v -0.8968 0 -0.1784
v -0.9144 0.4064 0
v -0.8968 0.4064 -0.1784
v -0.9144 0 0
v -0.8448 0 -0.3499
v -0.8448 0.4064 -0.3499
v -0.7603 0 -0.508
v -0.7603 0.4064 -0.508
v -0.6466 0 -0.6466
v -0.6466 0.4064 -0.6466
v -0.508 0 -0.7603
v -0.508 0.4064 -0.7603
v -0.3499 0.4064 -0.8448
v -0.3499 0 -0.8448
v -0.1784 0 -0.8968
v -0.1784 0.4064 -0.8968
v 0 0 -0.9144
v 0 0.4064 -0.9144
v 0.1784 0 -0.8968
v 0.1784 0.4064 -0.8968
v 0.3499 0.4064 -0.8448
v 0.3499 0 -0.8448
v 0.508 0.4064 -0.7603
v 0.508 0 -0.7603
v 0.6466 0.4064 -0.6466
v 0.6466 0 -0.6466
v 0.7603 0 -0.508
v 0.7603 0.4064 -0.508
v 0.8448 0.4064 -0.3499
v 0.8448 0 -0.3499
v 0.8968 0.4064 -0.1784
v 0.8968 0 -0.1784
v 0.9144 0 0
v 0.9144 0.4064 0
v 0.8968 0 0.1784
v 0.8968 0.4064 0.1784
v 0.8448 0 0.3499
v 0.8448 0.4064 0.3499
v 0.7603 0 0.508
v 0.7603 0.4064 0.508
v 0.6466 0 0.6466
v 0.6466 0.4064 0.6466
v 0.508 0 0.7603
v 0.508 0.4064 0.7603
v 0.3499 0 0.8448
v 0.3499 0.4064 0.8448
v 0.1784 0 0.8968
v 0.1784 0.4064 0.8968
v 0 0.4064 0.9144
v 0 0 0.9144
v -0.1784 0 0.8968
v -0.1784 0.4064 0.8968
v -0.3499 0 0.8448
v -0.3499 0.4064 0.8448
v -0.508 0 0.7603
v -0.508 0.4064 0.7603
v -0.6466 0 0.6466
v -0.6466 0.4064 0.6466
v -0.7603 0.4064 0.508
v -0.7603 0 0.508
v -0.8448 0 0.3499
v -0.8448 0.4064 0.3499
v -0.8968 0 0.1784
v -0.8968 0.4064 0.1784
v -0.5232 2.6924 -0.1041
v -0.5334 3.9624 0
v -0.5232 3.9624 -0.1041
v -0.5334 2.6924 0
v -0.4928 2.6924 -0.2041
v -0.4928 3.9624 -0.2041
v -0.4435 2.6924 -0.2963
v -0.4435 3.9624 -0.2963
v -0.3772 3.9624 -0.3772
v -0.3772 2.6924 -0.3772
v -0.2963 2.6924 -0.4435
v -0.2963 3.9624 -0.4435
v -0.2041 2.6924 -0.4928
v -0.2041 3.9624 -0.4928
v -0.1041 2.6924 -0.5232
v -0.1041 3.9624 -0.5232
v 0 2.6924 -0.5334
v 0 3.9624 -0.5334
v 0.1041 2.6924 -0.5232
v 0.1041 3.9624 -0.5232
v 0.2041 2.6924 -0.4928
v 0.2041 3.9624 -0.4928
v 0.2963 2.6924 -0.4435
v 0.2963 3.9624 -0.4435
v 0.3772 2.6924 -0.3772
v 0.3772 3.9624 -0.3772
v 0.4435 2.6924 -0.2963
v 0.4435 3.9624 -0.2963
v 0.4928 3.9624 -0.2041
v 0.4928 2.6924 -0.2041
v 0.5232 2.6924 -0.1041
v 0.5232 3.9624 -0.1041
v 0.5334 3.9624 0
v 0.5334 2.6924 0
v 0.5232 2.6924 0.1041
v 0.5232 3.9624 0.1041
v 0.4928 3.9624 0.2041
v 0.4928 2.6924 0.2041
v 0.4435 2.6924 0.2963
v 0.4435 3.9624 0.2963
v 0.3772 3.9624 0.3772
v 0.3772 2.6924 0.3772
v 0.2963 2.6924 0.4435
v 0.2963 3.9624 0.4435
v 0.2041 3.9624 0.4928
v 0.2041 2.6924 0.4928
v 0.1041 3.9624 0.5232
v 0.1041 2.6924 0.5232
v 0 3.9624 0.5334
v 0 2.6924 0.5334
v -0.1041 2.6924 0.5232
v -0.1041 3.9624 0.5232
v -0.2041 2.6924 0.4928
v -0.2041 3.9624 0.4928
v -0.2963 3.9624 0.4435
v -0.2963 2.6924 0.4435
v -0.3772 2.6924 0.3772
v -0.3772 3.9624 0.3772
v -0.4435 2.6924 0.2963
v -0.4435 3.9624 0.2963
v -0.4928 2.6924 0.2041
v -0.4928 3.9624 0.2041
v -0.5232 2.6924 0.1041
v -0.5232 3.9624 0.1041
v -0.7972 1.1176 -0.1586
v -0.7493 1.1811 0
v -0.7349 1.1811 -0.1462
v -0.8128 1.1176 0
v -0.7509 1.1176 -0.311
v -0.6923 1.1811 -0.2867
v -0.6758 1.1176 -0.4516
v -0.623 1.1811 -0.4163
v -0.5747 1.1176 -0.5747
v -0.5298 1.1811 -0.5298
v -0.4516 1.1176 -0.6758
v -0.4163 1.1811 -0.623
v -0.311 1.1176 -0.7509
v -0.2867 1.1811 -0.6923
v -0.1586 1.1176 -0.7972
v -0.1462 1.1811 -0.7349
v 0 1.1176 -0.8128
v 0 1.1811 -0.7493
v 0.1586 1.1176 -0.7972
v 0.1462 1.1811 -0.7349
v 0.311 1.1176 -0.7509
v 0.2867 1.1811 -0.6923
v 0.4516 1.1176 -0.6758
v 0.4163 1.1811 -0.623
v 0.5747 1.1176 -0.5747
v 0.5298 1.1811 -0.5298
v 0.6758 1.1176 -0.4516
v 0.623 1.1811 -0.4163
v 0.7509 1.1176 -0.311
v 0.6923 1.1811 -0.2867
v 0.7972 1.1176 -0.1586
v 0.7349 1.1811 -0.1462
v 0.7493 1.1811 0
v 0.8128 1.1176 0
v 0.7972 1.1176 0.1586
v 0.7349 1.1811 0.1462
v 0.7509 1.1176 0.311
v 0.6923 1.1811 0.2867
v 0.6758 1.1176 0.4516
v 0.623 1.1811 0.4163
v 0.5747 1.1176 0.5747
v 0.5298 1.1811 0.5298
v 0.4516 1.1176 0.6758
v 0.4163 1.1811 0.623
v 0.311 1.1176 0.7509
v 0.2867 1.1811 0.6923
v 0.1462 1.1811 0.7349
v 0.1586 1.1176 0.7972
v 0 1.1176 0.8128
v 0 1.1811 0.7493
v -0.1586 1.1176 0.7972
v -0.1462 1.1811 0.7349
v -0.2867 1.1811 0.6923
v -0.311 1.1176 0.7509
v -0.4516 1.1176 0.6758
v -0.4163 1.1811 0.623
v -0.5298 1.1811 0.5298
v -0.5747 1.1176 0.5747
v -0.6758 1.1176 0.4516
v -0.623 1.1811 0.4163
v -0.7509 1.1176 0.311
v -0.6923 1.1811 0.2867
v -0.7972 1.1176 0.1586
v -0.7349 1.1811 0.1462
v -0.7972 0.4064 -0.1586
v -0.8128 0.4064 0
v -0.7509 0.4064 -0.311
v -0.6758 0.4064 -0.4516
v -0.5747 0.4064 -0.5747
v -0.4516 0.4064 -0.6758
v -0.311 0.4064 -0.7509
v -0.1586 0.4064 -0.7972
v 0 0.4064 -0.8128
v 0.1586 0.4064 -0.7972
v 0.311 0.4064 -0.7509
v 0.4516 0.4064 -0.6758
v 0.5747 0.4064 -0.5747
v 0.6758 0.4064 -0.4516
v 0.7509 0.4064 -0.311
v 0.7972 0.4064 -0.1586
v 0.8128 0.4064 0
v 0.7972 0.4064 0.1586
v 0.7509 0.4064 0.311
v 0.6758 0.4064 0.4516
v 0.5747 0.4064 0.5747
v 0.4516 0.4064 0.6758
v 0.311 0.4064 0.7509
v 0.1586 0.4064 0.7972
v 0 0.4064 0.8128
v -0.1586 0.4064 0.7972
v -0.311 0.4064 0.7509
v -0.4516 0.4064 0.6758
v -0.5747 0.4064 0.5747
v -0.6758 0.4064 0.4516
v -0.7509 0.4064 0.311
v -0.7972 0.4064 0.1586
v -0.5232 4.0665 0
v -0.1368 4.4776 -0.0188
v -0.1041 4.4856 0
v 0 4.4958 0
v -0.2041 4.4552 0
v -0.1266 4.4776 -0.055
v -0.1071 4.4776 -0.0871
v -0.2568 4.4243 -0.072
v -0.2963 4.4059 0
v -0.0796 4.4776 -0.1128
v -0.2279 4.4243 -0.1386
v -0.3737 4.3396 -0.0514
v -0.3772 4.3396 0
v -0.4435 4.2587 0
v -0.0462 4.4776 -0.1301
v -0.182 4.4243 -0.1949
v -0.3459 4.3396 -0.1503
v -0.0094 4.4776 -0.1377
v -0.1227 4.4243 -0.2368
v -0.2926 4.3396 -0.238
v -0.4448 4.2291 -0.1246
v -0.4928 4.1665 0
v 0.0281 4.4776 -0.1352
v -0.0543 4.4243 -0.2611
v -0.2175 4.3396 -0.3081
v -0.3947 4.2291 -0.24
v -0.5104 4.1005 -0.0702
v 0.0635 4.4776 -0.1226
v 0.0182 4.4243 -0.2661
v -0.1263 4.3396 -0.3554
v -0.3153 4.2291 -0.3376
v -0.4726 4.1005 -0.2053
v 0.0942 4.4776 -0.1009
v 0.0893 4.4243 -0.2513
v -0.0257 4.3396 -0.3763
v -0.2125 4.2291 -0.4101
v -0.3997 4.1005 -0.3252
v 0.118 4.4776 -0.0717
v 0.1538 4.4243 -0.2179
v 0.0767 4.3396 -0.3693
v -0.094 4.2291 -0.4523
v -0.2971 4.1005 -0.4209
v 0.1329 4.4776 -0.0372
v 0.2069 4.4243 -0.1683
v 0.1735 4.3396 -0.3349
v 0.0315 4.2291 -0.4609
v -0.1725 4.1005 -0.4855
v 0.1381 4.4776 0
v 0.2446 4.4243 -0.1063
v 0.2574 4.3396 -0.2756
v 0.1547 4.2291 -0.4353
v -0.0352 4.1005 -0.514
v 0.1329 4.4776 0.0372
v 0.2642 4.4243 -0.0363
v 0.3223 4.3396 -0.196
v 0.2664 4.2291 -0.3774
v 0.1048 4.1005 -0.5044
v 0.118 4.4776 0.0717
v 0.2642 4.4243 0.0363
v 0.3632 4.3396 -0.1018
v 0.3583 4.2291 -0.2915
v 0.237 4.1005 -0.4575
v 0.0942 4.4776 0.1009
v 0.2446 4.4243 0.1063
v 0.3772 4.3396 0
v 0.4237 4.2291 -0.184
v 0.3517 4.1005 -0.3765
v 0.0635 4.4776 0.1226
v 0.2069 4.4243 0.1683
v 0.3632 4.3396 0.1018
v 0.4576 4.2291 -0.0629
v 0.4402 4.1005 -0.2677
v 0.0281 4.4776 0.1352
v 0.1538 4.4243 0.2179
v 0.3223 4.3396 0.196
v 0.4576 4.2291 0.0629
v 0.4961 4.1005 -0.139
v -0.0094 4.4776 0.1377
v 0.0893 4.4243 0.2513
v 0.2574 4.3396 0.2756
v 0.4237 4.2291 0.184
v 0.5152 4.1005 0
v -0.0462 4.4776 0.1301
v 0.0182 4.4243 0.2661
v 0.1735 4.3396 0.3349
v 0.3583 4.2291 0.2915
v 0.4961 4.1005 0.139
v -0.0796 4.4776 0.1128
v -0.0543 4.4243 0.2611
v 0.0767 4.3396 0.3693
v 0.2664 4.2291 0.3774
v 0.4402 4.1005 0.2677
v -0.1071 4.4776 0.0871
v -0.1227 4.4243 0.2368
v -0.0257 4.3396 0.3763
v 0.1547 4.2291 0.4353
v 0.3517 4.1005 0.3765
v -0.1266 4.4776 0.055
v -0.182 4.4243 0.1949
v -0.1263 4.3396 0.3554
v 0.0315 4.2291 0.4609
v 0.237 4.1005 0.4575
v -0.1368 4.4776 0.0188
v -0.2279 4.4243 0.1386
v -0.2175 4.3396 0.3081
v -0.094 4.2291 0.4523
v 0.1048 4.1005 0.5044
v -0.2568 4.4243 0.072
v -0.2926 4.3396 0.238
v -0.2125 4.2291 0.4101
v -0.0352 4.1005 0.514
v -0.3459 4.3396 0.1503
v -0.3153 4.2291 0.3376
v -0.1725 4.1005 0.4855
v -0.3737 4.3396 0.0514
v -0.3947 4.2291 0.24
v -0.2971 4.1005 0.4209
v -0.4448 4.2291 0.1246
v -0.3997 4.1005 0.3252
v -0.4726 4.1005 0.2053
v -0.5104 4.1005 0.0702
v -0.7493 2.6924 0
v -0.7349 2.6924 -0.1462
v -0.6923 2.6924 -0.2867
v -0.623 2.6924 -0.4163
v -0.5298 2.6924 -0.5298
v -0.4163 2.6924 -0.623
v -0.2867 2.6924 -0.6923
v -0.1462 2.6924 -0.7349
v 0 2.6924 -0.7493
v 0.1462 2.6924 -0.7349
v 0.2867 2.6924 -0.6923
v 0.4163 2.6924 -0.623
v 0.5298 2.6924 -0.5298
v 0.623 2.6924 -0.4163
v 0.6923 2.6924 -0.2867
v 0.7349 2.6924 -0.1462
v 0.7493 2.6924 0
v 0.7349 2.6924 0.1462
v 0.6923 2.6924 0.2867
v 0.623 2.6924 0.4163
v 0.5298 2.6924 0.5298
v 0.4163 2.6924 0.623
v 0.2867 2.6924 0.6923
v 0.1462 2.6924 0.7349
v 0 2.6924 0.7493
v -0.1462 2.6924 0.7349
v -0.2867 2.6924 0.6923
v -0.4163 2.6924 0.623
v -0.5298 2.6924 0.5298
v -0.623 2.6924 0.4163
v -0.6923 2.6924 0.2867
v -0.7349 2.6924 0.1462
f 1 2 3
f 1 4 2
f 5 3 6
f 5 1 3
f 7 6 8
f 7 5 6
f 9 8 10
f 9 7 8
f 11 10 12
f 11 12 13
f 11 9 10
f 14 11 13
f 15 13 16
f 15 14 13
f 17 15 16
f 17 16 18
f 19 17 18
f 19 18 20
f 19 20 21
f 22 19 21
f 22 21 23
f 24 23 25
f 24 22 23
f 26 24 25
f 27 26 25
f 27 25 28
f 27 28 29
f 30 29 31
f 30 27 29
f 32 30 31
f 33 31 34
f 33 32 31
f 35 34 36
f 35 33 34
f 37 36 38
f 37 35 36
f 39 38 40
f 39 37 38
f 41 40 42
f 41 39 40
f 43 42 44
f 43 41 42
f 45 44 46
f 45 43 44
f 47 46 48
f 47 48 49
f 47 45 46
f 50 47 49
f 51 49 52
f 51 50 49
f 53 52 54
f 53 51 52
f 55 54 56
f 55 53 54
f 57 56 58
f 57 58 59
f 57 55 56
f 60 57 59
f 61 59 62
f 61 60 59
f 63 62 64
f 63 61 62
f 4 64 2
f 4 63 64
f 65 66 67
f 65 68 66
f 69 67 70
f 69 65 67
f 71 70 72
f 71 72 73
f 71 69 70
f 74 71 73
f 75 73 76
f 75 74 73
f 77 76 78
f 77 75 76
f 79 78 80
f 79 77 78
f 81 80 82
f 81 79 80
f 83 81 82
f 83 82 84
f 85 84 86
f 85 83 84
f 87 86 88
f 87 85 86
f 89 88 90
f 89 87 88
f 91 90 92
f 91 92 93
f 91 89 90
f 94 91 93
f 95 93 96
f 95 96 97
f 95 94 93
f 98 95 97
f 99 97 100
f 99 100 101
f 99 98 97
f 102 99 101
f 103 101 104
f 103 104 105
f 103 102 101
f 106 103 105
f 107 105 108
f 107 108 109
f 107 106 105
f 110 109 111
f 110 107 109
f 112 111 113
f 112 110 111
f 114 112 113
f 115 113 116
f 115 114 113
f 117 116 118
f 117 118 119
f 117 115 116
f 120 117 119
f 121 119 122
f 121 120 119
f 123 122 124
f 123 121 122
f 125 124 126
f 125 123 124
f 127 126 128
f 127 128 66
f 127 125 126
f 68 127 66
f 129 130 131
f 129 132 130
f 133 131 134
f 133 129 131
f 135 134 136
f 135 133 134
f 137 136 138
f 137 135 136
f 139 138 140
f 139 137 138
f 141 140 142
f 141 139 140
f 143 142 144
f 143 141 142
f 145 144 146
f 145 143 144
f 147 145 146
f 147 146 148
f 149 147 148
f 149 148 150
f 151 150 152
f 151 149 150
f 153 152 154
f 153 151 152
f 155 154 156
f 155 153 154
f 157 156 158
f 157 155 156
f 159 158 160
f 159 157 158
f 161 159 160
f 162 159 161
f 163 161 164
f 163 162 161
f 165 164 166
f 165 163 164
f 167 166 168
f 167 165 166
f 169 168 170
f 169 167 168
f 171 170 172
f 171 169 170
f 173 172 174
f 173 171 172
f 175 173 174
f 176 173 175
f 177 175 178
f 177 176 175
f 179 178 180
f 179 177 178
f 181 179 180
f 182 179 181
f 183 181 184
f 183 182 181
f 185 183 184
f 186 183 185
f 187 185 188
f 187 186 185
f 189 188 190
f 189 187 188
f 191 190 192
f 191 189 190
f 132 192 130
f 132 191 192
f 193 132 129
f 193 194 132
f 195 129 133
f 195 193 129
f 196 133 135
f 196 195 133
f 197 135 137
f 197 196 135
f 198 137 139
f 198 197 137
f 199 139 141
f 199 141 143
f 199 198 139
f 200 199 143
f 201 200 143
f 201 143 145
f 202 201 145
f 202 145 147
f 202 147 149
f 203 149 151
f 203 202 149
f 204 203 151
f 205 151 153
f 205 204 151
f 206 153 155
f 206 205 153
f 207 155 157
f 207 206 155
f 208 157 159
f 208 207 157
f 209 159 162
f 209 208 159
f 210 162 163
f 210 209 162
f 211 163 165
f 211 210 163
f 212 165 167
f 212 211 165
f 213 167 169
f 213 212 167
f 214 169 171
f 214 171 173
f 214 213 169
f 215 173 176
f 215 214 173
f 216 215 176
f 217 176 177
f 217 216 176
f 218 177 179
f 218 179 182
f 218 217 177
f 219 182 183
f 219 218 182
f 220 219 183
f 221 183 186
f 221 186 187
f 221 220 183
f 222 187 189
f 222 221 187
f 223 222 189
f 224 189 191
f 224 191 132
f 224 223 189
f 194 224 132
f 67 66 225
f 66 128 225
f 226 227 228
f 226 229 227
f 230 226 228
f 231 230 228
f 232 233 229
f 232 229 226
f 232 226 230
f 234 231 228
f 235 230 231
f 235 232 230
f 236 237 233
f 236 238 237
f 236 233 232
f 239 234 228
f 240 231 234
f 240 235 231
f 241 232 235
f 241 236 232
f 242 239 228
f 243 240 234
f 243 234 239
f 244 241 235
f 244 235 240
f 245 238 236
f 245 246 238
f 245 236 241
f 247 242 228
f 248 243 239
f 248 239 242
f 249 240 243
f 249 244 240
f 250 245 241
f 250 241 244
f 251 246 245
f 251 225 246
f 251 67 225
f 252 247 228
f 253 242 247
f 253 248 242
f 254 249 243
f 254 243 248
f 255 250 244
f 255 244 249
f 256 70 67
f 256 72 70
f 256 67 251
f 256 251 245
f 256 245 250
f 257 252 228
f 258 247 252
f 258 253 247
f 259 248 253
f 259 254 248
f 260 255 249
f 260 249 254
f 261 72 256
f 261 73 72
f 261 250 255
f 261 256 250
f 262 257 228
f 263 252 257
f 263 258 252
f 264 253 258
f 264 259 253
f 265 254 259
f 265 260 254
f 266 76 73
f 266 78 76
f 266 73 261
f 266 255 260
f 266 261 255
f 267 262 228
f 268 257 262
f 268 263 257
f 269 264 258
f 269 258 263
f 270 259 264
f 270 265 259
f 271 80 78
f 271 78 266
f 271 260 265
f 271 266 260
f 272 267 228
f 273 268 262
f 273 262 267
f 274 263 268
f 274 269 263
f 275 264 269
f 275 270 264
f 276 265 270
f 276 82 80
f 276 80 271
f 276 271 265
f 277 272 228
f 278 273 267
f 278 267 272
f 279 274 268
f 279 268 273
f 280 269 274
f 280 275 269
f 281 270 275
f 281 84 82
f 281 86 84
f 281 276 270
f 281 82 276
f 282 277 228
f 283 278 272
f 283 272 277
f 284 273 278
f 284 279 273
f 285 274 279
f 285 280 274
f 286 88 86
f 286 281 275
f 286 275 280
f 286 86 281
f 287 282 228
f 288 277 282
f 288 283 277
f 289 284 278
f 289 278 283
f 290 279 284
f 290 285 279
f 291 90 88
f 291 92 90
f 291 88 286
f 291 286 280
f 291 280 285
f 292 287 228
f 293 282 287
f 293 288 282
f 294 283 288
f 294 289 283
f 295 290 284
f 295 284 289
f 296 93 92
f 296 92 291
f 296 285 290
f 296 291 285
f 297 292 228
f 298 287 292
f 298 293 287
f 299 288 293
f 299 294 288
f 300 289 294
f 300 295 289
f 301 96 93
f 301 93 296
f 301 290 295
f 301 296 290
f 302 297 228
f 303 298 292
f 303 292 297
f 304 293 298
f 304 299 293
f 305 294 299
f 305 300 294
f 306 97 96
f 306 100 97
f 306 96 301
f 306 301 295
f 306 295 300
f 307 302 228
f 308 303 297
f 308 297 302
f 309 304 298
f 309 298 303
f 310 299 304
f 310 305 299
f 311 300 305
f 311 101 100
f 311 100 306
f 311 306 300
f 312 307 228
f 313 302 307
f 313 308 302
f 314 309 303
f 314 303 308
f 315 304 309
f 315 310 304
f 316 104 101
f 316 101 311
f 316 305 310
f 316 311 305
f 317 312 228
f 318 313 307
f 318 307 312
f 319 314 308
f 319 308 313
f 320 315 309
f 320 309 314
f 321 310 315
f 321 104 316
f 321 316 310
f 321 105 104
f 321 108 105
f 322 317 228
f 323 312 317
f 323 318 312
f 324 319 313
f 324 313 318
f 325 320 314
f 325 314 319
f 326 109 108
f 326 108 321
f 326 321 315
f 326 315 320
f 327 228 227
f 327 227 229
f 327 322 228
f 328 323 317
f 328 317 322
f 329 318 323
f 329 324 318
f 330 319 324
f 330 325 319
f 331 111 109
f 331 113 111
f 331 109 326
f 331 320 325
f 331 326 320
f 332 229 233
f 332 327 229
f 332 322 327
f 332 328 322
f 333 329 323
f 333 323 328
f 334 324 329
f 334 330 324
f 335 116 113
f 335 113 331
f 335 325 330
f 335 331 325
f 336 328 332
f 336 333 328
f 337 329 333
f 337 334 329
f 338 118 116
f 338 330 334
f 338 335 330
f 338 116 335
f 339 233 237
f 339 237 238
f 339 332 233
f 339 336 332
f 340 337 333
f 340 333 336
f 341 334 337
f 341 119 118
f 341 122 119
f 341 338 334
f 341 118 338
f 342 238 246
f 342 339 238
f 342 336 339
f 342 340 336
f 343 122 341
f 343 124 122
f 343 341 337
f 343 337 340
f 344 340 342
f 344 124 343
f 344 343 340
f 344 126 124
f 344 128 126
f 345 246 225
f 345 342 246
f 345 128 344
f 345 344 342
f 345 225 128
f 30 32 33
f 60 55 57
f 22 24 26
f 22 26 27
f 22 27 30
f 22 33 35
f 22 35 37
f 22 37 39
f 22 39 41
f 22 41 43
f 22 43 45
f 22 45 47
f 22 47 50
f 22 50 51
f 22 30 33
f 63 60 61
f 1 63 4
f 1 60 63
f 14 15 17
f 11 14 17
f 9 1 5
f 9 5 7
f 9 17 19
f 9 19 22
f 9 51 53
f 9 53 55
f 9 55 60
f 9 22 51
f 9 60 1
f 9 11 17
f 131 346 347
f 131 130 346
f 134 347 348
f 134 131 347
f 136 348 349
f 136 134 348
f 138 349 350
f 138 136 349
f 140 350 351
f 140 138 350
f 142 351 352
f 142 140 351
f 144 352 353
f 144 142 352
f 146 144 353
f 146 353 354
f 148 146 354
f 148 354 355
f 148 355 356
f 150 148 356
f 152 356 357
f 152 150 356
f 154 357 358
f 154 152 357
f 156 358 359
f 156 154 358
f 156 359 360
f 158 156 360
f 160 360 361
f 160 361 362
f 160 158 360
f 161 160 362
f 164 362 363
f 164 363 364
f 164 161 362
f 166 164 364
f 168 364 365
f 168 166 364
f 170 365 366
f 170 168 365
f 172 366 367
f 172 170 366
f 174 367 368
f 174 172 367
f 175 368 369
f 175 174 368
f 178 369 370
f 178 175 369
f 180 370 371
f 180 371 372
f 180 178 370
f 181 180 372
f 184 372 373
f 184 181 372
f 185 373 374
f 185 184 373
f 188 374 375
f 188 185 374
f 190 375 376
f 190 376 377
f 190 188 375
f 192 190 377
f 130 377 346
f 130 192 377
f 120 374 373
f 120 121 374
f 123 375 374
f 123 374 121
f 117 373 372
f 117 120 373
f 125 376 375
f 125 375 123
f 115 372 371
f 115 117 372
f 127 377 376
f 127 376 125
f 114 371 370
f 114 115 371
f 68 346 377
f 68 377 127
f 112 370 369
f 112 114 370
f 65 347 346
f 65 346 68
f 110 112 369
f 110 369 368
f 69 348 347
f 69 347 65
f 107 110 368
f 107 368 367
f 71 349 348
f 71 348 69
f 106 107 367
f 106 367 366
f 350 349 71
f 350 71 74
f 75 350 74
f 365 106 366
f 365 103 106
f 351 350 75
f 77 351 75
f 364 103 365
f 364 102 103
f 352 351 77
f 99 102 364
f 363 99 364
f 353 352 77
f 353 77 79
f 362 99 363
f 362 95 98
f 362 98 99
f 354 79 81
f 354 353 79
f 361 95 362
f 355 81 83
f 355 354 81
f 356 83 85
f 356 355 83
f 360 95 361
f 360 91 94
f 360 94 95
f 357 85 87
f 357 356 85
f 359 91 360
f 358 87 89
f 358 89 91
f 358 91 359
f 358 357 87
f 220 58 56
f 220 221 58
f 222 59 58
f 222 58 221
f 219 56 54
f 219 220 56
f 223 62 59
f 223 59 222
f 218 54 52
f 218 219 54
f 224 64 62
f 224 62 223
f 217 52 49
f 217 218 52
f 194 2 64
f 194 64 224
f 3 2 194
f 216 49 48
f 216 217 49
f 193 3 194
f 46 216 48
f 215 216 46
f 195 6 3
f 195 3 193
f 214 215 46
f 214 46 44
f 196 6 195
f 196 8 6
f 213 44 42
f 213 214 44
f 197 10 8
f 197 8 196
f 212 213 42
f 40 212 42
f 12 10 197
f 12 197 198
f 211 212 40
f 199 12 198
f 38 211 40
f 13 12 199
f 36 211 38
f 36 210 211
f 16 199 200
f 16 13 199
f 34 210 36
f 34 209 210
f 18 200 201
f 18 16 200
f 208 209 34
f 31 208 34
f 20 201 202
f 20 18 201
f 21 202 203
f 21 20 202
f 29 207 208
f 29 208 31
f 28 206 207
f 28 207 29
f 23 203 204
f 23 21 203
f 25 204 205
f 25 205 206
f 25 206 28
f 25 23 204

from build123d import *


with BuildPart() as part:
    # Sketch3 → Revolve1 (revolve)
    with BuildSketch(Plane.XY):
        with BuildLine():
            Line((-0.5334, 3.9624), (0, 3.9624))
            Line((0, 3.9624), (0, 4.4958))
            ThreePointArc((0, 4.4958), (-0.377170757, 4.339570757), (-0.5334, 3.9624))
        make_face()
        with BuildLine():
            ThreePointArc((-0.5334, 3.9624), (-0.377170757, 3.585229243), (0, 3.429))
            Line((0, 3.429), (0, 3.9624))
            Line((0, 3.9624), (-0.5334, 3.9624))
        make_face()
        with BuildLine():
            Line((-0.8128, 1.1176), (0, 1.1176))
            Line((0, 1.1176), (0, 3.429))
            ThreePointArc((0, 3.429), (-0.377170757, 3.585229243), (-0.5334, 3.9624))
            Line((-0.5334, 3.9624), (-0.5334, 2.6924))
            Line((-0.5334, 2.6924), (-0.7493, 2.6924))
            Line((-0.7493, 2.6924), (-0.7493, 1.1811))
            Line((-0.7493, 1.1811), (-0.8128, 1.1176))
        make_face()
        Polygon((-0.9144, 0), (0, 0), (0, 1.1176), (-0.8128, 1.1176), (-0.8128, 0.4064), (-0.9144, 0.4064), align=None)
    revolve(axis=Axis((0, 3.9624, 0), (0, -1, 0)))


solid = part.part
